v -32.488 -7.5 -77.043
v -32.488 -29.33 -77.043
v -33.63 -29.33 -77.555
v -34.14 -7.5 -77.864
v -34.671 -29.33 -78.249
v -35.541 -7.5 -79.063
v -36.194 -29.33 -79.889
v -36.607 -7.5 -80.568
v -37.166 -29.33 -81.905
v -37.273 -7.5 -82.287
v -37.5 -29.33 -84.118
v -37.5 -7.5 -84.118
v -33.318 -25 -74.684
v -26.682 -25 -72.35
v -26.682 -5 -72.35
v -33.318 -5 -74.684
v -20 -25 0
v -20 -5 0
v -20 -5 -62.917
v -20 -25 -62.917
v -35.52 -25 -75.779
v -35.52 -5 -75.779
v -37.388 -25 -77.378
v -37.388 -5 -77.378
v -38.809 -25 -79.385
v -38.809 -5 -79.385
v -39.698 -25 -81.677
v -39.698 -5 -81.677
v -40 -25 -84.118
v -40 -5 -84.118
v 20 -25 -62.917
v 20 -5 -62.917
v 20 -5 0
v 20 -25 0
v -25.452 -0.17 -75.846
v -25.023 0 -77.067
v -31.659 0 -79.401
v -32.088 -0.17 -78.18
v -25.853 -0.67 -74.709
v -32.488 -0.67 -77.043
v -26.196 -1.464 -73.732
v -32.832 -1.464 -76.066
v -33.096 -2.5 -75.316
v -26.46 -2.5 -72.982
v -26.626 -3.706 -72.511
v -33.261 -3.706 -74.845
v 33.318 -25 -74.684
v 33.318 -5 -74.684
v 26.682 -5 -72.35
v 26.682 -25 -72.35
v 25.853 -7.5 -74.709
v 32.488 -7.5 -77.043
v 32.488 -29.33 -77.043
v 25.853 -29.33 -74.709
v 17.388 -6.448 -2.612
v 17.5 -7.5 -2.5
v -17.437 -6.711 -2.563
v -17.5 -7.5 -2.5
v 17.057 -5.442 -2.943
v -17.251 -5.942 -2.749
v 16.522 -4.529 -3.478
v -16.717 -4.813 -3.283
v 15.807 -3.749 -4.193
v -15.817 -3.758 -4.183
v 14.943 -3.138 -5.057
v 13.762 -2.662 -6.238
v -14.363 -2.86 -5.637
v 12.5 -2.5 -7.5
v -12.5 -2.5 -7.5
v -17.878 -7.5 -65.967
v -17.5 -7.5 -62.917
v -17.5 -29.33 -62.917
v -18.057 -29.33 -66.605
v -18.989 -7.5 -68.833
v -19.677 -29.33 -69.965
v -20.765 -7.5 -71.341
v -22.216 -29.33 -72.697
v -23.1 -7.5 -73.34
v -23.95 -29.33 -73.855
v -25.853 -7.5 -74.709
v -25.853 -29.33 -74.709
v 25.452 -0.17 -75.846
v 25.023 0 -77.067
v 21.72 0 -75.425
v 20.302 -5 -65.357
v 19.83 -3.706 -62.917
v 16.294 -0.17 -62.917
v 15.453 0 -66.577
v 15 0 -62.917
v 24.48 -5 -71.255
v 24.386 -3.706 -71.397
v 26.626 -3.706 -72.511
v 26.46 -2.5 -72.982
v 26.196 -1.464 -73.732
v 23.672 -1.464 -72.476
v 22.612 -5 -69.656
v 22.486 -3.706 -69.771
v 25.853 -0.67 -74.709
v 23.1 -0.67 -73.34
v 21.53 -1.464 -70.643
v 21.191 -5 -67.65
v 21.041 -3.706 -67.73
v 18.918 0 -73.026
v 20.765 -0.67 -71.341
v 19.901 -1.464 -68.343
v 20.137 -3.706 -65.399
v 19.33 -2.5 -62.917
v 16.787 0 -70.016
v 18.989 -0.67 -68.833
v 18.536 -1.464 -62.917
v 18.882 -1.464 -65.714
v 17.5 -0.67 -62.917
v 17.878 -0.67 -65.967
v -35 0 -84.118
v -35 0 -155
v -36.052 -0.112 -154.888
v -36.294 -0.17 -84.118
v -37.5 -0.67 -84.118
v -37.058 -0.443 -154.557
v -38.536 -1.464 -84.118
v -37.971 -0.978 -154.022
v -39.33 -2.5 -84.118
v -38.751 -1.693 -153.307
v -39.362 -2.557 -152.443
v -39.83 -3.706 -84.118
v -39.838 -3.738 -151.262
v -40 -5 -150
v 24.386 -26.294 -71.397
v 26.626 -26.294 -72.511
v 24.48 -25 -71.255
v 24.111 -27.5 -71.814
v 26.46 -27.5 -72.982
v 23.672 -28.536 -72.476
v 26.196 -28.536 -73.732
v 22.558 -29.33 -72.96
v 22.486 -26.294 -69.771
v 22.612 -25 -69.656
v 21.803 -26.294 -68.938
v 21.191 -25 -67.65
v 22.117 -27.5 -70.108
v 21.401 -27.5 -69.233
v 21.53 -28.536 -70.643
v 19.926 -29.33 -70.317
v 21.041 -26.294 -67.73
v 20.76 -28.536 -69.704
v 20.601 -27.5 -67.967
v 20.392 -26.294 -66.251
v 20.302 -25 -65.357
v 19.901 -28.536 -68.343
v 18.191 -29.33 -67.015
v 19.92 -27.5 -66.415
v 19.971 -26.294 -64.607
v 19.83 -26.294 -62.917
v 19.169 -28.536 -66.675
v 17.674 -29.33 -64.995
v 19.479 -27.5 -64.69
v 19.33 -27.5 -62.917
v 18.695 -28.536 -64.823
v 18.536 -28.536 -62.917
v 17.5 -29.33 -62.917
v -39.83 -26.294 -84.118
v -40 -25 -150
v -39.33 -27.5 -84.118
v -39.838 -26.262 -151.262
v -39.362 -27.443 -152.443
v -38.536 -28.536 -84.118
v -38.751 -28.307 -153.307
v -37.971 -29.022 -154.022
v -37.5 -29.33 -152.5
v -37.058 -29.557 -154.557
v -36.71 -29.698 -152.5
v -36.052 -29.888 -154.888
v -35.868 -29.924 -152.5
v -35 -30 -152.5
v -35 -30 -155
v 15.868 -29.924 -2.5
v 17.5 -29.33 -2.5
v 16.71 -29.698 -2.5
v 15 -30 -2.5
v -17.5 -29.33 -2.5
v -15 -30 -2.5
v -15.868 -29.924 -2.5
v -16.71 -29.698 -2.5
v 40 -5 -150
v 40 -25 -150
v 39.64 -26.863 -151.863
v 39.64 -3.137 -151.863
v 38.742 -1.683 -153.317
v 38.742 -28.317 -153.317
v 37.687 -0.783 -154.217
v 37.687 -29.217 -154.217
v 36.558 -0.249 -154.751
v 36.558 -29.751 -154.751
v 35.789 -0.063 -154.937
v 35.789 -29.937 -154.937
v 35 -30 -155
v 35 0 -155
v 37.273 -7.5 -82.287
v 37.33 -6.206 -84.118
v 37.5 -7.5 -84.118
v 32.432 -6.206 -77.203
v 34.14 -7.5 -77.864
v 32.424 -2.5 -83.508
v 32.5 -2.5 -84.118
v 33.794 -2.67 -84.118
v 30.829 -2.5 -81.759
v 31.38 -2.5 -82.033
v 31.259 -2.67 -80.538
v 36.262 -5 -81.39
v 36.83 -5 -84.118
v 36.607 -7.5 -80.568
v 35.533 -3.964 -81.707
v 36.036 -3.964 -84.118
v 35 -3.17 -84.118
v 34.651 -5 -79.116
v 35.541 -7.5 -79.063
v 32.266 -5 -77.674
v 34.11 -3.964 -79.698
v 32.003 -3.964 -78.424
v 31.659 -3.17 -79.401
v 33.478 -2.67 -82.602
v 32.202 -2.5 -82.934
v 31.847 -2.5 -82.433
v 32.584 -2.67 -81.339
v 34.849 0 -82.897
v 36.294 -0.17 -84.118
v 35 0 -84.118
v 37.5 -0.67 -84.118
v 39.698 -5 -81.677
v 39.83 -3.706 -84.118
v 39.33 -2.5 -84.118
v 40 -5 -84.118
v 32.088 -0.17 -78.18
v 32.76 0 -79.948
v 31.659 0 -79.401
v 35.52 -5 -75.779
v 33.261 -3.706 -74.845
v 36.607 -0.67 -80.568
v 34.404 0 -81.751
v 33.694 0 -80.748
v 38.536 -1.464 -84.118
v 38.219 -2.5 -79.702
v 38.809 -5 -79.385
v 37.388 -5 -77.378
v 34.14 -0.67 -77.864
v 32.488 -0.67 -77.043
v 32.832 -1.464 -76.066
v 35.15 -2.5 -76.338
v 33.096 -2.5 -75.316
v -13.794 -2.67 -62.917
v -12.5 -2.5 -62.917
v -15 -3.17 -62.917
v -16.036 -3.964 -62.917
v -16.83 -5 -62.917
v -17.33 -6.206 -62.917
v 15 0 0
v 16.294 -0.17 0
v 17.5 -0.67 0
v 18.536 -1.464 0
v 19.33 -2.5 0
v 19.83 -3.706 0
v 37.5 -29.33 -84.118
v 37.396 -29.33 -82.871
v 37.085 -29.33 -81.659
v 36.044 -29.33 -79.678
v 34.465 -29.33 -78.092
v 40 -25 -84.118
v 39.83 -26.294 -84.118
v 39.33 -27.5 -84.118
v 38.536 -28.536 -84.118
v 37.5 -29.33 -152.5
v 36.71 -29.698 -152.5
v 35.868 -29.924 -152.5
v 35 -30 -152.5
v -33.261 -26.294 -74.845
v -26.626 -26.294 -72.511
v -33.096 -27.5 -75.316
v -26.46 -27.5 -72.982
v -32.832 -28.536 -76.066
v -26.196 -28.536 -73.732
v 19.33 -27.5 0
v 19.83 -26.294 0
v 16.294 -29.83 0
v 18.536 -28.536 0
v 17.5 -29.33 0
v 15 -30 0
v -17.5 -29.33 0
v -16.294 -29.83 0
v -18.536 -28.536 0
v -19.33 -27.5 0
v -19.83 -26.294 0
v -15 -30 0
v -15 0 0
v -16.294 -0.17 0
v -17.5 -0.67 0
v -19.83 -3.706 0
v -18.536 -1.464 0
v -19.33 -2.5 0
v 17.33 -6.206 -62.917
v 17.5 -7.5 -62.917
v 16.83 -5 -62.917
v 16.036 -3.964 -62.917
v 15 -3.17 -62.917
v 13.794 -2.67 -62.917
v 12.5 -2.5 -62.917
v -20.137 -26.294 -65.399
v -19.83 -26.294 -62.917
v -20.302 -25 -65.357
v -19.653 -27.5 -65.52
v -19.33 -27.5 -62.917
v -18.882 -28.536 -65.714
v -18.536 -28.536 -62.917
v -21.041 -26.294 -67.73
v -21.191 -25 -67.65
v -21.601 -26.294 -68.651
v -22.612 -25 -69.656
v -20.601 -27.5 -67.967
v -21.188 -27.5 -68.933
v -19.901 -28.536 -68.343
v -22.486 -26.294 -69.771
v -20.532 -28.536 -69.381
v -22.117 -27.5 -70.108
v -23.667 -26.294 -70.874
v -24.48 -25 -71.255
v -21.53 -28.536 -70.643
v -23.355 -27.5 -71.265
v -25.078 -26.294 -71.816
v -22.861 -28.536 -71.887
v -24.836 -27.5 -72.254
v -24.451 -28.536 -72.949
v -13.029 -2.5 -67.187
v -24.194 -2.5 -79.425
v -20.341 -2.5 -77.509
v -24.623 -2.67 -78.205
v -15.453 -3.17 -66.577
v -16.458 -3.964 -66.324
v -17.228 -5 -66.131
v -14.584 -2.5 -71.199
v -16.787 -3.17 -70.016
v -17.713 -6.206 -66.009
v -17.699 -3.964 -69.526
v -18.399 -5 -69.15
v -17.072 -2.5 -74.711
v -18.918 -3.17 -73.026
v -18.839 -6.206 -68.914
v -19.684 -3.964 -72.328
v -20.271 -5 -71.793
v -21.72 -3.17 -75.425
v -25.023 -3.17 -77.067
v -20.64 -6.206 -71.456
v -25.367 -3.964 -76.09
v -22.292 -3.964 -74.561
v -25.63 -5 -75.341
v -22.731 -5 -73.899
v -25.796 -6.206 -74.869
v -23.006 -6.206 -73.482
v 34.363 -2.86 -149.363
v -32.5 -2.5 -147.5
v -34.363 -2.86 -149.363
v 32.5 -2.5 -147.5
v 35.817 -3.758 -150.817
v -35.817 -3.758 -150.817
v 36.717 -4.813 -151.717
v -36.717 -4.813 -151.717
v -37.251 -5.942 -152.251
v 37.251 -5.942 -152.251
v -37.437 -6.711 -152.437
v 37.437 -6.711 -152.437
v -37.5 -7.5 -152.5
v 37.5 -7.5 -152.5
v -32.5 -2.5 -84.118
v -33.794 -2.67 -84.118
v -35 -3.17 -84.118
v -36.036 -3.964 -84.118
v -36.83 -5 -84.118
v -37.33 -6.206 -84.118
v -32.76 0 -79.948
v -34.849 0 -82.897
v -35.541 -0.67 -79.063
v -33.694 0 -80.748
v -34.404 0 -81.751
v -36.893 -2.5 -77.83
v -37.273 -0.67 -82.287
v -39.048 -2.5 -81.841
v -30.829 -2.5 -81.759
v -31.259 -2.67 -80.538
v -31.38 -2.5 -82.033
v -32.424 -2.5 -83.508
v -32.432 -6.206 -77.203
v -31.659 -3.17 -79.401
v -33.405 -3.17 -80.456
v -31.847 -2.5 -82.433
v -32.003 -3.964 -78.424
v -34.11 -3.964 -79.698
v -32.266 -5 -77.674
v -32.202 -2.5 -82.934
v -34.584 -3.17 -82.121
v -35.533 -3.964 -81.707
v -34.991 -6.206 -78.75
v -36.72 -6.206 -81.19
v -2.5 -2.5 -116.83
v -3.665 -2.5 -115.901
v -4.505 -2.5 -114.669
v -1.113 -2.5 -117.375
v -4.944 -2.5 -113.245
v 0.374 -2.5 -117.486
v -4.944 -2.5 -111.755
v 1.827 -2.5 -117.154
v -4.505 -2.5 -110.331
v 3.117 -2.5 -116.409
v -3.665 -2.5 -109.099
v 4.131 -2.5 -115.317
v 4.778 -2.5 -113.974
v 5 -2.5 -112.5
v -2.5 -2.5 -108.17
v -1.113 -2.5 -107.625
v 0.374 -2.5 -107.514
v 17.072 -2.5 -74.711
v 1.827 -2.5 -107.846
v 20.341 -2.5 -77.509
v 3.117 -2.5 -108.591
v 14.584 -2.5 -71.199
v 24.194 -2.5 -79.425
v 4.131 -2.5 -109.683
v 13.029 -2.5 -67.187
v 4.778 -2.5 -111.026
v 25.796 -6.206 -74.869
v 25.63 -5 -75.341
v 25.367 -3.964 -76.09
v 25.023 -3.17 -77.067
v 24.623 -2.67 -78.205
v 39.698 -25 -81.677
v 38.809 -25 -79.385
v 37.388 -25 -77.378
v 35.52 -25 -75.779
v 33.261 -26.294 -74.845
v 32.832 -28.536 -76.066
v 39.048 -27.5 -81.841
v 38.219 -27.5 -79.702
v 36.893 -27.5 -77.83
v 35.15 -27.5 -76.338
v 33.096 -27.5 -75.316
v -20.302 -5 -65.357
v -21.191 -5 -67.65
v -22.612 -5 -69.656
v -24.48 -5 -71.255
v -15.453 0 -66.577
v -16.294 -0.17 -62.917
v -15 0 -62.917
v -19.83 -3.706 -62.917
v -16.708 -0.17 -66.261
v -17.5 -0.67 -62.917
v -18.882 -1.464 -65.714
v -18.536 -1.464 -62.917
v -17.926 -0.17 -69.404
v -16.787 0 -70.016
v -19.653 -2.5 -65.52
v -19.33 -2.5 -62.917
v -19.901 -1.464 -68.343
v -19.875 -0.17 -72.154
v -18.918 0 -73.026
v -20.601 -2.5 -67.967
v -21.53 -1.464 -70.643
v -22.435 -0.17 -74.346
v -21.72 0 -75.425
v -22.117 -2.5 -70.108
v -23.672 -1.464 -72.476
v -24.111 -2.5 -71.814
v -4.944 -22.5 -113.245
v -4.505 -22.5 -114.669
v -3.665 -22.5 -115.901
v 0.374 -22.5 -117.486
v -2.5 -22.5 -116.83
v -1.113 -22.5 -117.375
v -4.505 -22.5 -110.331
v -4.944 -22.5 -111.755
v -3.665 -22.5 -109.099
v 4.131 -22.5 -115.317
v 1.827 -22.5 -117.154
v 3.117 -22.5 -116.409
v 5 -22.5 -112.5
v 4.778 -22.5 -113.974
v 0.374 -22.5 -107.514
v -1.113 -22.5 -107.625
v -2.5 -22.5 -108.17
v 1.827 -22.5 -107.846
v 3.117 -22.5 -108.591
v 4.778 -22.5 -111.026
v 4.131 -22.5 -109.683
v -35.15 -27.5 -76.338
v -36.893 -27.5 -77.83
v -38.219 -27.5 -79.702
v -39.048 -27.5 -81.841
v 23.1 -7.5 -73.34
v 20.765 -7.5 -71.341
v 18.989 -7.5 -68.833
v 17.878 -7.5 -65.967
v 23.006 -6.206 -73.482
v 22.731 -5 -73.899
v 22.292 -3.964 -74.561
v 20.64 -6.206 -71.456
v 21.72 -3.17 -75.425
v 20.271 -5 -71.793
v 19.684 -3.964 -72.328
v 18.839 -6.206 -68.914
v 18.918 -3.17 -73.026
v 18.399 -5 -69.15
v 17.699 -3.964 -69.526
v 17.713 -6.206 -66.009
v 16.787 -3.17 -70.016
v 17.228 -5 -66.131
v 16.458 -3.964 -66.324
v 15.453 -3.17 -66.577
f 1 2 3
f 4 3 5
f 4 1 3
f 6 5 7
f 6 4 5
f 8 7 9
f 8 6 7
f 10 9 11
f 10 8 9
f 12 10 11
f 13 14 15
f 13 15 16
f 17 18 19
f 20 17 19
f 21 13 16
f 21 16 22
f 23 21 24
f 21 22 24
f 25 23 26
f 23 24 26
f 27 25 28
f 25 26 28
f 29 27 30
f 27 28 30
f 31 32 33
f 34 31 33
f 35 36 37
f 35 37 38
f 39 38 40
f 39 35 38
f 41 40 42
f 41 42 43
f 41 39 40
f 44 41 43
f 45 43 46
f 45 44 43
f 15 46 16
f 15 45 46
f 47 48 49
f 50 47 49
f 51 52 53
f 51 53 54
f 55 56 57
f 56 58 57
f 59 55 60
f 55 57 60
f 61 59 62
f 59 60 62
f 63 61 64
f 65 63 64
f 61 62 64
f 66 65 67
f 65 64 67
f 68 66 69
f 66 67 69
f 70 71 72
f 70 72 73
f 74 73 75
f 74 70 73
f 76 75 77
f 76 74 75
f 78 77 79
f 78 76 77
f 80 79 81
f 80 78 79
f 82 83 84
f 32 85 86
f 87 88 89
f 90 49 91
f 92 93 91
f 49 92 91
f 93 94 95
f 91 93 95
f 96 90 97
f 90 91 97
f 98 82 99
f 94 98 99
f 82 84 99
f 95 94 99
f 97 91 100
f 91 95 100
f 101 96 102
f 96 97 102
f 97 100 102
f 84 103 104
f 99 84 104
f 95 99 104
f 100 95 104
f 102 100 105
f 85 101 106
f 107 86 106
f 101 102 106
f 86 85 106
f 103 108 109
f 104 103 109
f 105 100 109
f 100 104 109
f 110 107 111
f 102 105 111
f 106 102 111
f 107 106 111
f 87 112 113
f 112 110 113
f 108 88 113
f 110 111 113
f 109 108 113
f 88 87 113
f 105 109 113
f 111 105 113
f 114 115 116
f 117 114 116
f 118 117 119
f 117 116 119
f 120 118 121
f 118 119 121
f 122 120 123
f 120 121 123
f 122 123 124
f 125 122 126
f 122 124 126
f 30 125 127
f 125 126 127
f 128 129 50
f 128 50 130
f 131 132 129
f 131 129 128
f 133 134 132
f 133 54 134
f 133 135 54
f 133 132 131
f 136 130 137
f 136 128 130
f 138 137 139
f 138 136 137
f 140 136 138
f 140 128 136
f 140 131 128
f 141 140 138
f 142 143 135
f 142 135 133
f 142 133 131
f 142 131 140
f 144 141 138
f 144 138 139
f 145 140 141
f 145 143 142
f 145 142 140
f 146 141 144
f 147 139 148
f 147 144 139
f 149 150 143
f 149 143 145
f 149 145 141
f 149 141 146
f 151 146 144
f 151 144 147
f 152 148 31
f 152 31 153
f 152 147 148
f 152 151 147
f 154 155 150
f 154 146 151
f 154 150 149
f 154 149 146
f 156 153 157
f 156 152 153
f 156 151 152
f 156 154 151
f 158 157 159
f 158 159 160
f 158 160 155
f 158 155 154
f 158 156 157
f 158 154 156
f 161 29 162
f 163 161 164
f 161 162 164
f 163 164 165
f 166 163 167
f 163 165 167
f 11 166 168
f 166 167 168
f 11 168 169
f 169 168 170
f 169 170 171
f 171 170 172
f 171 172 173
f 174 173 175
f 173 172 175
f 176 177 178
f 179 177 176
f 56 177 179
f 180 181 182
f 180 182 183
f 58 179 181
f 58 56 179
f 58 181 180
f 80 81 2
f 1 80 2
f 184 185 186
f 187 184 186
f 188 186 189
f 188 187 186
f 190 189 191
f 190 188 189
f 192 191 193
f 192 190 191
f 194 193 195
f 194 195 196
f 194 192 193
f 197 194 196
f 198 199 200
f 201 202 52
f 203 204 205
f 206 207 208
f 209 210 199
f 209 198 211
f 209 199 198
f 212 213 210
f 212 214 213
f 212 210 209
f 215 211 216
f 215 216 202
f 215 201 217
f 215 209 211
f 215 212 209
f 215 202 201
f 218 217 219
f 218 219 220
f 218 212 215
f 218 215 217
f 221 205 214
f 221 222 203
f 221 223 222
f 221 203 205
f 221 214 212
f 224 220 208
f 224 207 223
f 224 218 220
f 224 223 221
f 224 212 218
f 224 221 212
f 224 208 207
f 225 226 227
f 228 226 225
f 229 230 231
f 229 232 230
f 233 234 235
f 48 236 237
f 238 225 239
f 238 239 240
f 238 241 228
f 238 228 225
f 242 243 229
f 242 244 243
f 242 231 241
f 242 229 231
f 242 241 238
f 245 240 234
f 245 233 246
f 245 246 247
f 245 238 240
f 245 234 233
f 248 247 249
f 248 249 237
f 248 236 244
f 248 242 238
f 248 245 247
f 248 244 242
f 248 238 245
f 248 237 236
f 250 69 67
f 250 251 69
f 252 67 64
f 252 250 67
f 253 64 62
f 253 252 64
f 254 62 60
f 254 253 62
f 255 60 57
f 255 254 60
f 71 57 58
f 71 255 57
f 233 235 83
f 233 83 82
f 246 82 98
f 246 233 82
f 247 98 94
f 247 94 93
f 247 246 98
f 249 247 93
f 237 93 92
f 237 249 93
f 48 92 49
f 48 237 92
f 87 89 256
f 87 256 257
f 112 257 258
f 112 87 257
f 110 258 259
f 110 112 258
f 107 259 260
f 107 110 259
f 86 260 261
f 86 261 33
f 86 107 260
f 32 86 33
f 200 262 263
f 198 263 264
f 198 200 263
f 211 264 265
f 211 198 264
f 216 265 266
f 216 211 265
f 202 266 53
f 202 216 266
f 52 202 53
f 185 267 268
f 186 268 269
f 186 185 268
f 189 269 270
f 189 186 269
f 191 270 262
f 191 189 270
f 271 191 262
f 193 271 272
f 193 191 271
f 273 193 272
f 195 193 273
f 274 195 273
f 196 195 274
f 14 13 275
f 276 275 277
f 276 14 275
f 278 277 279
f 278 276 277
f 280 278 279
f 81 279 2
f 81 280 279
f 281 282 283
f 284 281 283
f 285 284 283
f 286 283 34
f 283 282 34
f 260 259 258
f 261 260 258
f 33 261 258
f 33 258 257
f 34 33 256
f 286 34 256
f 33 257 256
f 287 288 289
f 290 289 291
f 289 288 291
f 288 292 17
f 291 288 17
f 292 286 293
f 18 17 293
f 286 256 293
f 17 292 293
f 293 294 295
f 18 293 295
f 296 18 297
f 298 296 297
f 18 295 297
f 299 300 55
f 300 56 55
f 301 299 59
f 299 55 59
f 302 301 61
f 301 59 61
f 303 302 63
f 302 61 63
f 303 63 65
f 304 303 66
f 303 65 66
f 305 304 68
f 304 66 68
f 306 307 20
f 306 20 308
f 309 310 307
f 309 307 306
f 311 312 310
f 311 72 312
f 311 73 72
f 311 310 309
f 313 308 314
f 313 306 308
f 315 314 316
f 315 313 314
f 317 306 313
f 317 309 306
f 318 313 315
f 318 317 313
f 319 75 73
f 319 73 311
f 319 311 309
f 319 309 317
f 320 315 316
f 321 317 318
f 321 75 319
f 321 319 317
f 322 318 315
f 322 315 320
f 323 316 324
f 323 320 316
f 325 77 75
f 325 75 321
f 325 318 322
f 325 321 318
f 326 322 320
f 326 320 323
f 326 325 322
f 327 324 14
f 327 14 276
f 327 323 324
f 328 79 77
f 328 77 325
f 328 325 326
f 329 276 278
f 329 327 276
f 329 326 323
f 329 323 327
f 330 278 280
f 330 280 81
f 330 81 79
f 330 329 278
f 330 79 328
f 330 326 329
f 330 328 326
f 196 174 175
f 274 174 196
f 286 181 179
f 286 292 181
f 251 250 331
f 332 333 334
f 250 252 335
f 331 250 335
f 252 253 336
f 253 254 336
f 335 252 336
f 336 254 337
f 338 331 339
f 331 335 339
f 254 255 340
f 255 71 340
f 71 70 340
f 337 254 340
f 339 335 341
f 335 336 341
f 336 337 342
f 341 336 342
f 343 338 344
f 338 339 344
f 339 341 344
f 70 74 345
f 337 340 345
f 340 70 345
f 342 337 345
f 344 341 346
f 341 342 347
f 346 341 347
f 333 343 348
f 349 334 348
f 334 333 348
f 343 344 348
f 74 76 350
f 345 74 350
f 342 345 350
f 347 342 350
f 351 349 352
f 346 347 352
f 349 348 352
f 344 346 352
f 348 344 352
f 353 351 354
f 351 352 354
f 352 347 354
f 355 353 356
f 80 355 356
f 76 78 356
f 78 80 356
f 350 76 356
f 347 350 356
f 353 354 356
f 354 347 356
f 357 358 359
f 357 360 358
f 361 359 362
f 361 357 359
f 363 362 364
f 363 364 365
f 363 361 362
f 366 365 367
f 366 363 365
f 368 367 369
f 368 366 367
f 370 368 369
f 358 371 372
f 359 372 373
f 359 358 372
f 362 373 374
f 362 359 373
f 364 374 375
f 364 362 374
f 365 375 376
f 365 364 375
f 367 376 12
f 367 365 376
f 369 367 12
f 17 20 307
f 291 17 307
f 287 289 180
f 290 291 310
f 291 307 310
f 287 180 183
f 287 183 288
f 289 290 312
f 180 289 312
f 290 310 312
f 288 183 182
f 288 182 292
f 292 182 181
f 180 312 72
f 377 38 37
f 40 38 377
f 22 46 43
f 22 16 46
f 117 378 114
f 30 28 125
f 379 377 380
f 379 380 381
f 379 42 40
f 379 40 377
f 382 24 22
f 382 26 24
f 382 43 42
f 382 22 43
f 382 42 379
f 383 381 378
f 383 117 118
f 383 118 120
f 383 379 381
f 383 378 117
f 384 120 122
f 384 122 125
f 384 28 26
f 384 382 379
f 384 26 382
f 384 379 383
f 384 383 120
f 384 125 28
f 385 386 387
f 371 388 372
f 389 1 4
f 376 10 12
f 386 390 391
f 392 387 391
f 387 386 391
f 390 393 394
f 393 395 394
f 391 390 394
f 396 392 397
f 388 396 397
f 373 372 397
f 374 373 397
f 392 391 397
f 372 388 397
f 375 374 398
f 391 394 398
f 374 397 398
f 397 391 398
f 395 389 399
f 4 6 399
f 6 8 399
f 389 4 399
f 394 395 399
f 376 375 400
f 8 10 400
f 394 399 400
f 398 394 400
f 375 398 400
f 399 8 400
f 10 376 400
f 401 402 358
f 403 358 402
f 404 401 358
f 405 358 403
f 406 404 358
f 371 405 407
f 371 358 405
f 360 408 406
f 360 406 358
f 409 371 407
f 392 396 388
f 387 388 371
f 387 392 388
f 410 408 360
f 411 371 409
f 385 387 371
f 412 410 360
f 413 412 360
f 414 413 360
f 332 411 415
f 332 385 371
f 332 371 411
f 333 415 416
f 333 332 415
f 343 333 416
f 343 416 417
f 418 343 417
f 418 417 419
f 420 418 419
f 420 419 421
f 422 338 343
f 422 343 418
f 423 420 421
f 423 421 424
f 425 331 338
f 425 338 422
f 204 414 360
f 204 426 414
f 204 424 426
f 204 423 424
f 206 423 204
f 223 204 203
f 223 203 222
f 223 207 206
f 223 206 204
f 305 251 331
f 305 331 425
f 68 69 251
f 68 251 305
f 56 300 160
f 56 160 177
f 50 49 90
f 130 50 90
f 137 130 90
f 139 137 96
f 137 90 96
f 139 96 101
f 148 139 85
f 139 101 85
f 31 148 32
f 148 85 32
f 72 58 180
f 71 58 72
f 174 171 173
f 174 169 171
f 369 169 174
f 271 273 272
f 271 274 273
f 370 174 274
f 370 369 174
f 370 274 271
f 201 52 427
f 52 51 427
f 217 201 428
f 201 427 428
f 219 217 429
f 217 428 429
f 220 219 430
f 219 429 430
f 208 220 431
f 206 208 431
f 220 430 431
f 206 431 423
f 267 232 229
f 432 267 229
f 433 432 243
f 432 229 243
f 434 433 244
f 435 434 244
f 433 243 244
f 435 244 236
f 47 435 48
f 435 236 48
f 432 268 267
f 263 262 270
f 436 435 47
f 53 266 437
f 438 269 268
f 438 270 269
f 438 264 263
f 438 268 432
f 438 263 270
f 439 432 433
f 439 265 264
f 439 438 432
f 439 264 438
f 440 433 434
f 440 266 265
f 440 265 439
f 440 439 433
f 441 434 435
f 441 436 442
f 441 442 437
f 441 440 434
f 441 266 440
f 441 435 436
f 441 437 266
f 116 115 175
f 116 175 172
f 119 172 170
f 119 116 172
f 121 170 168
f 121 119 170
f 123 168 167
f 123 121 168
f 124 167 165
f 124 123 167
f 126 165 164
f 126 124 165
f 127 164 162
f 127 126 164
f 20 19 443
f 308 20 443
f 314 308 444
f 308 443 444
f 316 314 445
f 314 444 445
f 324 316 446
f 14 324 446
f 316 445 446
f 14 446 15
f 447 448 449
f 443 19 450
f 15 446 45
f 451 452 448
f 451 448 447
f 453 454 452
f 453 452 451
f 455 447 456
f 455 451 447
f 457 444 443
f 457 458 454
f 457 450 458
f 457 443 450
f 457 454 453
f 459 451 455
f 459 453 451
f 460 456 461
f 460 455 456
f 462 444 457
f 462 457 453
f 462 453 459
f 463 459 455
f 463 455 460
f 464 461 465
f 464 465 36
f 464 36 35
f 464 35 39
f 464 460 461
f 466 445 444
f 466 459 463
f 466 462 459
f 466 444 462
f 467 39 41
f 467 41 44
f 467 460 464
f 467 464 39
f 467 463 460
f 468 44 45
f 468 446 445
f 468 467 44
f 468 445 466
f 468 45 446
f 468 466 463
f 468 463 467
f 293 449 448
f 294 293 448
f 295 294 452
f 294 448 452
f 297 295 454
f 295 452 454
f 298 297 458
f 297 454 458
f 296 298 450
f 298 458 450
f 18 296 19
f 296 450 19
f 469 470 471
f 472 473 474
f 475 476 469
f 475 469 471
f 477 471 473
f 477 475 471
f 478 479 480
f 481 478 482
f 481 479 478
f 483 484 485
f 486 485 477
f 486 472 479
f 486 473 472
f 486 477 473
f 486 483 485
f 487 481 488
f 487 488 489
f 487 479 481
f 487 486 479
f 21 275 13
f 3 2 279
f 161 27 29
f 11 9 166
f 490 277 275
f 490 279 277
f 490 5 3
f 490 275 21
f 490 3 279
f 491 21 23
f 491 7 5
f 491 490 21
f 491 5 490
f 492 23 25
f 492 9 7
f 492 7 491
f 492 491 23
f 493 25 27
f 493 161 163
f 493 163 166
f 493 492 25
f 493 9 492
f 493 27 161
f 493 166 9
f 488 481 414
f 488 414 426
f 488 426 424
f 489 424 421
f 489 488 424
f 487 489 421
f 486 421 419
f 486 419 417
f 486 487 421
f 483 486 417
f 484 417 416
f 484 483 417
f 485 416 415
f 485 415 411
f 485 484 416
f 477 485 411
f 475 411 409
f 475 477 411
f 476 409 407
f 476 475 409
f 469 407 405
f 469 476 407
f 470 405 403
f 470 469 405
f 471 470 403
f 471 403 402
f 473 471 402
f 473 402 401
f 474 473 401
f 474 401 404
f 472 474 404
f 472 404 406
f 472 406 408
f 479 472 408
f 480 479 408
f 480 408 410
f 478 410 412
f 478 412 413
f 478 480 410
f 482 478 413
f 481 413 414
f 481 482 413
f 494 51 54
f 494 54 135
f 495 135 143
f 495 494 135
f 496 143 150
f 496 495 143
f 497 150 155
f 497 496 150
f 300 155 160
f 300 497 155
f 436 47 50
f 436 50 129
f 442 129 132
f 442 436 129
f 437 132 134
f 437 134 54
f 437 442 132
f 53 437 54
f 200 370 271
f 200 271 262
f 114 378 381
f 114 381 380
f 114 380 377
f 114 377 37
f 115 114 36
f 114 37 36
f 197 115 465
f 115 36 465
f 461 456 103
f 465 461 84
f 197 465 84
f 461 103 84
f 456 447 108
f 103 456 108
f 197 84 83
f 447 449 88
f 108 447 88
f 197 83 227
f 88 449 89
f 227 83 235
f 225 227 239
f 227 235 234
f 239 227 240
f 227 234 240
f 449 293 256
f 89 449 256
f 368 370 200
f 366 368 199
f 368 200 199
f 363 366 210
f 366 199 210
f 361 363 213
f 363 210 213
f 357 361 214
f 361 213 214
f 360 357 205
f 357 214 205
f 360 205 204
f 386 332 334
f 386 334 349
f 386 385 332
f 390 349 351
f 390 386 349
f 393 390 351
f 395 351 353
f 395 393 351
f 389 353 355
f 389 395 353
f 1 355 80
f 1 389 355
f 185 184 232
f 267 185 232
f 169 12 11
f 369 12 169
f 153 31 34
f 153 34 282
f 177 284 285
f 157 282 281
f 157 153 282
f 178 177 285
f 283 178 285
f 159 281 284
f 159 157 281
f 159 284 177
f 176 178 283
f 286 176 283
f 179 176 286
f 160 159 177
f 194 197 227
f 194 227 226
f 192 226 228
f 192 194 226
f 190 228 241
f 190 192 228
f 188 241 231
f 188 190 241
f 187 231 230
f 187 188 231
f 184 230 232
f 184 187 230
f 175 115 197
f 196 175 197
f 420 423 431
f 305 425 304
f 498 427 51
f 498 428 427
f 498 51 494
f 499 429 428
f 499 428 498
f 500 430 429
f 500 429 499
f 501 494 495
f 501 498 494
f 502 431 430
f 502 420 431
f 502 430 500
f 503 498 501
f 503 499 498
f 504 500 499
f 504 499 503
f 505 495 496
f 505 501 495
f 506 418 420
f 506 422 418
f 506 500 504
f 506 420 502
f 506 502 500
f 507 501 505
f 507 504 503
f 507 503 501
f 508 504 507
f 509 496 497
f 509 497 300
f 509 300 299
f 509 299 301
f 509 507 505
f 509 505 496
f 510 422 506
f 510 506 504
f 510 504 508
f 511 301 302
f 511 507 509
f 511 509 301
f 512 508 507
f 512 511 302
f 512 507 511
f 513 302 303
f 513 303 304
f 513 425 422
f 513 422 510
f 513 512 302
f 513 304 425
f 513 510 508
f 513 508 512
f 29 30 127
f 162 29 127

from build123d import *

# Parameters (mm, degrees)
F1_DEPTH     = 30
F2_T         = -2.5
F3_T1_DEPTH  = 55
F3_T3_DEPTH  = 83.3823547945
F3_T5_DEPTH  = 7.0343109423
F3_T7_DEPTH  = 75.4166657368
F3_T9_DEPTH  = 7.0343109423
F3_T12_ANGLE = 70.6224339747
F3_T14_ANGLE = 70.6224339747
F3_T16_ANGLE = 70.6224339747
F3_T18_ANGLE = 70.6224339747
F3_T20_ANGLE = 70.6224339747
F3_T22_ANGLE = 70.6224339747
F3_T24_ANGLE = 70.6224339747
F3_T26_ANGLE = 70.6224339747
F5_R         = 5
F6_DEPTH     = 20
F7_R         = 5


# Not quite as in the source:
# - a fillet or chamfer that OpenCascade refuses, or shapes differently, is made with other operations: its cross-section is extruded or revolved along the edge and cut away or added


with BuildPart() as f1:
    # F0 (on Front) → F1 (new body)
    with BuildSketch(Plane.XZ):
        with BuildLine():
            Line((20, 0), (0, 0))
            Line((0, 0), (-20, 0))
            Line((-20, 0), (-20, -62.9166657368))
            ThreePointArc((-20, -62.9166657368), (-21.8397555469, -68.6968396499), (-26.6820820931, -72.3501921592))
            Line((-26.6820820931, -72.3501921592), (-33.3179179069, -74.6841187831))
            ThreePointArc((-33.3179179069, -74.6841187831), (-38.1602444531, -78.3374712924), (-40, -84.1176452055))
            Line((-40, -84.1176452055), (-40, -155))
            Line((-40, -155), (0, -155))
            Line((0, -155), (40, -155))
            Line((40, -155), (40, -84.1176452055))
            ThreePointArc((40, -84.1176452055), (38.1602444531, -78.3374712924), (33.3179179069, -74.6841187831))
            Line((33.3179179069, -74.6841187831), (26.6820820931, -72.3501921592))
            ThreePointArc((26.6820820931, -72.3501921592), (21.8397555469, -68.6968396499), (20, -62.9166657368))
            Line((20, -62.9166657368), (20, 0))
        make_face()
    extrude(amount=F1_DEPTH)

    # F2
    f2_openings = [f1.faces().sort_by_distance(p)[0] for p in [
        (0, -30, -90.139239),
    ]]
    offset(amount=F2_T, openings=f2_openings)

    # F3: fillet of radius 5 on 8 edges, made by hand

    # F3_s2 → F3_t1 (cut)
    with BuildSketch(Plane.XZ.offset(-12.5)):
        with BuildLine():
            ThreePointArc((-35, -155), (-38.5355339059, -153.5355339059), (-40, -150))
            Line((-40, -150), (-40, -155))
            Line((-40, -155), (-35, -155))
        make_face()
        with BuildLine():
            ThreePointArc((40, -150), (38.5355339059, -153.5355339059), (35, -155))
            Line((35, -155), (40, -155))
            Line((40, -155), (40, -150))
        make_face()
    extrude(amount=F3_T1_DEPTH, mode=Mode.SUBTRACT)

    # F3_s4 → F3_t3 (cut)
    with BuildSketch(Plane.XY.offset(-167.5)):
        with BuildLine():
            ThreePointArc((-35, 0), (-38.5355339059, -1.4644660941), (-40, -5))
            Line((-40, -5), (-40, 0))
            Line((-40, 0), (-35, 0))
        make_face()
        with BuildLine():
            ThreePointArc((-40, -25), (-38.5355339059, -28.5355339059), (-35, -30))
            Line((-35, -30), (-40, -30))
            Line((-40, -30), (-40, -25))
        make_face()
        with BuildLine():
            ThreePointArc((35, 0), (38.5355339059, -1.4644660941), (40, -5))
            Line((40, -5), (40, 0))
            Line((40, 0), (35, 0))
        make_face()
        with BuildLine():
            ThreePointArc((40, -25), (38.5355339059, -28.5355339059), (35, -30))
            Line((35, -30), (40, -30))
            Line((40, -30), (40, -25))
        make_face()
    extrude(amount=F3_T3_DEPTH, mode=Mode.SUBTRACT)

    # F3_s6 → F3_t5 (cut)
    with BuildSketch(Plane(origin=(53.0259684291, 0, -18.6500574974), x_dir=(0, 1, 0), z_dir=(-0.9433526422, 0, 0.3317917907))):
        with BuildLine():
            ThreePointArc((-25, 59.3988491433), (-28.5355339059, 60.8633152374), (-30, 64.3988491433))
            Line((-30, 64.3988491433), (-30, 59.3988491433))
            Line((-30, 59.3988491433), (-25, 59.3988491433))
        make_face()
        with BuildLine():
            ThreePointArc((0, 64.3988491433), (-1.4644660941, 60.8633152374), (-5, 59.3988491433))
            Line((-5, 59.3988491433), (0, 59.3988491433))
            Line((0, 59.3988491433), (0, 64.3988491433))
        make_face()
    extrude(amount=F3_T5_DEPTH, mode=Mode.SUBTRACT)

    # F3_s8 → F3_t7 (cut)
    with BuildSketch(Plane.XY.offset(-62.9166657368)):
        with BuildLine():
            ThreePointArc((20, -25), (18.5355339059, -28.5355339059), (15, -30))
            Line((15, -30), (20, -30))
            Line((20, -30), (20, -25))
        make_face()
        with BuildLine():
            ThreePointArc((15, 0), (18.5355339059, -1.4644660941), (20, -5))
            Line((20, -5), (20, 0))
            Line((20, 0), (15, 0))
        make_face()
        with BuildLine():
            ThreePointArc((-20, -25), (-18.5355339059, -28.5355339059), (-15, -30))
            Line((-15, -30), (-20, -30))
            Line((-20, -30), (-20, -25))
        make_face()
        with BuildLine():
            ThreePointArc((-15, 0), (-18.5355339059, -1.4644660941), (-20, -5))
            Line((-20, -5), (-20, 0))
            Line((-20, 0), (-15, 0))
        make_face()
    extrude(amount=F3_T7_DEPTH, mode=Mode.SUBTRACT)

    # F3_s10 → F3_t9 (cut)
    with BuildSketch(Plane(origin=(-46.3901326153, 0, -16.3161308736), x_dir=(0, 1, 0), z_dir=(-0.9433526422, 0, -0.3317917907))):
        with BuildLine():
            ThreePointArc((-25, 59.3988491433), (-28.5355339059, 60.8633152374), (-30, 64.3988491433))
            Line((-30, 64.3988491433), (-30, 59.3988491433))
            Line((-30, 59.3988491433), (-25, 59.3988491433))
        make_face()
        with BuildLine():
            ThreePointArc((0, 64.3988491433), (-1.4644660941, 60.8633152374), (-5, 59.3988491433))
            Line((-5, 59.3988491433), (0, 59.3988491433))
            Line((0, 59.3988491433), (0, 64.3988491433))
        make_face()
    extrude(amount=F3_T9_DEPTH, mode=Mode.SUBTRACT)

    # F3_s11 → F3_t12 (revolve, cut)
    with BuildSketch(Plane.XY.offset(-84.1176452055)):
        with BuildLine():
            ThreePointArc((40, -25), (38.5355339059, -28.5355339059), (35, -30))
            Line((35, -30), (40, -30))
            Line((40, -30), (40, -25))
        make_face()
    revolve(axis=Axis((30, -30, -84.1176452055), (0, -1, 0)), revolution_arc=F3_T12_ANGLE, mode=Mode.SUBTRACT)

    # F3_s13 → F3_t14 (revolve, cut)
    with BuildSketch(Plane(origin=(46.3901326153, 0, -16.3161308736), x_dir=(0, 1, 0), z_dir=(0.9433526422, 0, -0.3317917907))):
        with BuildLine():
            ThreePointArc((-25, -59.3988491433), (-28.5355339059, -60.8633152374), (-30, -64.3988491433))
            Line((-30, -64.3988491433), (-30, -59.3988491433))
            Line((-30, -59.3988491433), (-25, -59.3988491433))
        make_face()
    revolve(axis=Axis((30, -30, -62.9166657368), (0, 1, 0)), revolution_arc=F3_T14_ANGLE, mode=Mode.SUBTRACT)

    # F3_s15 → F3_t16 (revolve, cut)
    with BuildSketch(Plane.XY.offset(-84.1176452055)):
        with BuildLine():
            ThreePointArc((35, 0), (38.5355339059, -1.4644660941), (40, -5))
            Line((40, -5), (40, 0))
            Line((40, 0), (35, 0))
        make_face()
    revolve(axis=Axis((30, 0, -84.1176452055), (0, -1, 0)), revolution_arc=F3_T16_ANGLE, mode=Mode.SUBTRACT)

    # F3_s17 → F3_t18 (revolve, cut)
    with BuildSketch(Plane(origin=(46.3901326153, 0, -16.3161308736), x_dir=(0, 1, 0), z_dir=(0.9433526422, 0, -0.3317917907))):
        with BuildLine():
            ThreePointArc((-5, -59.3988491433), (-1.4644660941, -60.8633152374), (0, -64.3988491433))
            Line((0, -64.3988491433), (0, -59.3988491433))
            Line((0, -59.3988491433), (-5, -59.3988491433))
        make_face()
    revolve(axis=Axis((30, 0, -62.9166657368), (0, 1, 0)), revolution_arc=F3_T18_ANGLE, mode=Mode.SUBTRACT)

    # F3_s19 → F3_t20 (revolve, cut)
    with BuildSketch(Plane(origin=(-53.0259684291, 0, -18.6500574974), x_dir=(0, 1, 0), z_dir=(0.9433526422, 0, 0.3317917907))):
        with BuildLine():
            ThreePointArc((-25, -59.3988491433), (-28.5355339059, -60.8633152374), (-30, -64.3988491433))
            Line((-30, -64.3988491433), (-30, -59.3988491433))
            Line((-30, -59.3988491433), (-25, -59.3988491433))
        make_face()
    revolve(axis=Axis((-30, -30, -84.1176452055), (0, -1, 0)), revolution_arc=F3_T20_ANGLE, mode=Mode.SUBTRACT)

    # F3_s21 → F3_t22 (revolve, cut)
    with BuildSketch(Plane.XY.offset(-62.9166657368)):
        with BuildLine():
            ThreePointArc((-20, -25), (-18.5355339059, -28.5355339059), (-15, -30))
            Line((-15, -30), (-20, -30))
            Line((-20, -30), (-20, -25))
        make_face()
    revolve(axis=Axis((-30, -30, -62.9166657368), (0, 1, 0)), revolution_arc=F3_T22_ANGLE, mode=Mode.SUBTRACT)

    # F3_s23 → F3_t24 (revolve, cut)
    with BuildSketch(Plane(origin=(-53.0259684291, 0, -18.6500574974), x_dir=(0, 1, 0), z_dir=(0.9433526422, 0, 0.3317917907))):
        with BuildLine():
            ThreePointArc((0, -64.3988491433), (-1.4644660941, -60.8633152374), (-5, -59.3988491433))
            Line((-5, -59.3988491433), (0, -59.3988491433))
            Line((0, -59.3988491433), (0, -64.3988491433))
        make_face()
    revolve(axis=Axis((-30, 0, -84.1176452055), (0, -1, 0)), revolution_arc=F3_T24_ANGLE, mode=Mode.SUBTRACT)

    # F3_s25 → F3_t26 (revolve, cut)
    with BuildSketch(Plane.XY.offset(-62.9166657368)):
        with BuildLine():
            ThreePointArc((-15, 0), (-18.5355339059, -1.4644660941), (-20, -5))
            Line((-20, -5), (-20, 0))
            Line((-20, 0), (-15, 0))
        make_face()
    revolve(axis=Axis((-30, 0, -62.9166657368), (0, 1, 0)), revolution_arc=F3_T26_ANGLE, mode=Mode.SUBTRACT)

    # F5 (on offset) → F6 (join)
    with BuildSketch(Plane.XZ.offset(22.5)):
        with Locations((0, -112.5)):
            Circle(F5_R)
    extrude(amount=-F6_DEPTH)

    # F7
    f7_edges = [f1.edges().sort_by_distance(p)[0] for p in [
        (-37.5, -2.5, -118.308823),
        (0, -2.5, -152.5),
        (0, -2.5, -2.5),
        (17.5, -2.5, -32.708333),
    ]]
    fillet(f7_edges, radius=F7_R)


solid = f1.part
